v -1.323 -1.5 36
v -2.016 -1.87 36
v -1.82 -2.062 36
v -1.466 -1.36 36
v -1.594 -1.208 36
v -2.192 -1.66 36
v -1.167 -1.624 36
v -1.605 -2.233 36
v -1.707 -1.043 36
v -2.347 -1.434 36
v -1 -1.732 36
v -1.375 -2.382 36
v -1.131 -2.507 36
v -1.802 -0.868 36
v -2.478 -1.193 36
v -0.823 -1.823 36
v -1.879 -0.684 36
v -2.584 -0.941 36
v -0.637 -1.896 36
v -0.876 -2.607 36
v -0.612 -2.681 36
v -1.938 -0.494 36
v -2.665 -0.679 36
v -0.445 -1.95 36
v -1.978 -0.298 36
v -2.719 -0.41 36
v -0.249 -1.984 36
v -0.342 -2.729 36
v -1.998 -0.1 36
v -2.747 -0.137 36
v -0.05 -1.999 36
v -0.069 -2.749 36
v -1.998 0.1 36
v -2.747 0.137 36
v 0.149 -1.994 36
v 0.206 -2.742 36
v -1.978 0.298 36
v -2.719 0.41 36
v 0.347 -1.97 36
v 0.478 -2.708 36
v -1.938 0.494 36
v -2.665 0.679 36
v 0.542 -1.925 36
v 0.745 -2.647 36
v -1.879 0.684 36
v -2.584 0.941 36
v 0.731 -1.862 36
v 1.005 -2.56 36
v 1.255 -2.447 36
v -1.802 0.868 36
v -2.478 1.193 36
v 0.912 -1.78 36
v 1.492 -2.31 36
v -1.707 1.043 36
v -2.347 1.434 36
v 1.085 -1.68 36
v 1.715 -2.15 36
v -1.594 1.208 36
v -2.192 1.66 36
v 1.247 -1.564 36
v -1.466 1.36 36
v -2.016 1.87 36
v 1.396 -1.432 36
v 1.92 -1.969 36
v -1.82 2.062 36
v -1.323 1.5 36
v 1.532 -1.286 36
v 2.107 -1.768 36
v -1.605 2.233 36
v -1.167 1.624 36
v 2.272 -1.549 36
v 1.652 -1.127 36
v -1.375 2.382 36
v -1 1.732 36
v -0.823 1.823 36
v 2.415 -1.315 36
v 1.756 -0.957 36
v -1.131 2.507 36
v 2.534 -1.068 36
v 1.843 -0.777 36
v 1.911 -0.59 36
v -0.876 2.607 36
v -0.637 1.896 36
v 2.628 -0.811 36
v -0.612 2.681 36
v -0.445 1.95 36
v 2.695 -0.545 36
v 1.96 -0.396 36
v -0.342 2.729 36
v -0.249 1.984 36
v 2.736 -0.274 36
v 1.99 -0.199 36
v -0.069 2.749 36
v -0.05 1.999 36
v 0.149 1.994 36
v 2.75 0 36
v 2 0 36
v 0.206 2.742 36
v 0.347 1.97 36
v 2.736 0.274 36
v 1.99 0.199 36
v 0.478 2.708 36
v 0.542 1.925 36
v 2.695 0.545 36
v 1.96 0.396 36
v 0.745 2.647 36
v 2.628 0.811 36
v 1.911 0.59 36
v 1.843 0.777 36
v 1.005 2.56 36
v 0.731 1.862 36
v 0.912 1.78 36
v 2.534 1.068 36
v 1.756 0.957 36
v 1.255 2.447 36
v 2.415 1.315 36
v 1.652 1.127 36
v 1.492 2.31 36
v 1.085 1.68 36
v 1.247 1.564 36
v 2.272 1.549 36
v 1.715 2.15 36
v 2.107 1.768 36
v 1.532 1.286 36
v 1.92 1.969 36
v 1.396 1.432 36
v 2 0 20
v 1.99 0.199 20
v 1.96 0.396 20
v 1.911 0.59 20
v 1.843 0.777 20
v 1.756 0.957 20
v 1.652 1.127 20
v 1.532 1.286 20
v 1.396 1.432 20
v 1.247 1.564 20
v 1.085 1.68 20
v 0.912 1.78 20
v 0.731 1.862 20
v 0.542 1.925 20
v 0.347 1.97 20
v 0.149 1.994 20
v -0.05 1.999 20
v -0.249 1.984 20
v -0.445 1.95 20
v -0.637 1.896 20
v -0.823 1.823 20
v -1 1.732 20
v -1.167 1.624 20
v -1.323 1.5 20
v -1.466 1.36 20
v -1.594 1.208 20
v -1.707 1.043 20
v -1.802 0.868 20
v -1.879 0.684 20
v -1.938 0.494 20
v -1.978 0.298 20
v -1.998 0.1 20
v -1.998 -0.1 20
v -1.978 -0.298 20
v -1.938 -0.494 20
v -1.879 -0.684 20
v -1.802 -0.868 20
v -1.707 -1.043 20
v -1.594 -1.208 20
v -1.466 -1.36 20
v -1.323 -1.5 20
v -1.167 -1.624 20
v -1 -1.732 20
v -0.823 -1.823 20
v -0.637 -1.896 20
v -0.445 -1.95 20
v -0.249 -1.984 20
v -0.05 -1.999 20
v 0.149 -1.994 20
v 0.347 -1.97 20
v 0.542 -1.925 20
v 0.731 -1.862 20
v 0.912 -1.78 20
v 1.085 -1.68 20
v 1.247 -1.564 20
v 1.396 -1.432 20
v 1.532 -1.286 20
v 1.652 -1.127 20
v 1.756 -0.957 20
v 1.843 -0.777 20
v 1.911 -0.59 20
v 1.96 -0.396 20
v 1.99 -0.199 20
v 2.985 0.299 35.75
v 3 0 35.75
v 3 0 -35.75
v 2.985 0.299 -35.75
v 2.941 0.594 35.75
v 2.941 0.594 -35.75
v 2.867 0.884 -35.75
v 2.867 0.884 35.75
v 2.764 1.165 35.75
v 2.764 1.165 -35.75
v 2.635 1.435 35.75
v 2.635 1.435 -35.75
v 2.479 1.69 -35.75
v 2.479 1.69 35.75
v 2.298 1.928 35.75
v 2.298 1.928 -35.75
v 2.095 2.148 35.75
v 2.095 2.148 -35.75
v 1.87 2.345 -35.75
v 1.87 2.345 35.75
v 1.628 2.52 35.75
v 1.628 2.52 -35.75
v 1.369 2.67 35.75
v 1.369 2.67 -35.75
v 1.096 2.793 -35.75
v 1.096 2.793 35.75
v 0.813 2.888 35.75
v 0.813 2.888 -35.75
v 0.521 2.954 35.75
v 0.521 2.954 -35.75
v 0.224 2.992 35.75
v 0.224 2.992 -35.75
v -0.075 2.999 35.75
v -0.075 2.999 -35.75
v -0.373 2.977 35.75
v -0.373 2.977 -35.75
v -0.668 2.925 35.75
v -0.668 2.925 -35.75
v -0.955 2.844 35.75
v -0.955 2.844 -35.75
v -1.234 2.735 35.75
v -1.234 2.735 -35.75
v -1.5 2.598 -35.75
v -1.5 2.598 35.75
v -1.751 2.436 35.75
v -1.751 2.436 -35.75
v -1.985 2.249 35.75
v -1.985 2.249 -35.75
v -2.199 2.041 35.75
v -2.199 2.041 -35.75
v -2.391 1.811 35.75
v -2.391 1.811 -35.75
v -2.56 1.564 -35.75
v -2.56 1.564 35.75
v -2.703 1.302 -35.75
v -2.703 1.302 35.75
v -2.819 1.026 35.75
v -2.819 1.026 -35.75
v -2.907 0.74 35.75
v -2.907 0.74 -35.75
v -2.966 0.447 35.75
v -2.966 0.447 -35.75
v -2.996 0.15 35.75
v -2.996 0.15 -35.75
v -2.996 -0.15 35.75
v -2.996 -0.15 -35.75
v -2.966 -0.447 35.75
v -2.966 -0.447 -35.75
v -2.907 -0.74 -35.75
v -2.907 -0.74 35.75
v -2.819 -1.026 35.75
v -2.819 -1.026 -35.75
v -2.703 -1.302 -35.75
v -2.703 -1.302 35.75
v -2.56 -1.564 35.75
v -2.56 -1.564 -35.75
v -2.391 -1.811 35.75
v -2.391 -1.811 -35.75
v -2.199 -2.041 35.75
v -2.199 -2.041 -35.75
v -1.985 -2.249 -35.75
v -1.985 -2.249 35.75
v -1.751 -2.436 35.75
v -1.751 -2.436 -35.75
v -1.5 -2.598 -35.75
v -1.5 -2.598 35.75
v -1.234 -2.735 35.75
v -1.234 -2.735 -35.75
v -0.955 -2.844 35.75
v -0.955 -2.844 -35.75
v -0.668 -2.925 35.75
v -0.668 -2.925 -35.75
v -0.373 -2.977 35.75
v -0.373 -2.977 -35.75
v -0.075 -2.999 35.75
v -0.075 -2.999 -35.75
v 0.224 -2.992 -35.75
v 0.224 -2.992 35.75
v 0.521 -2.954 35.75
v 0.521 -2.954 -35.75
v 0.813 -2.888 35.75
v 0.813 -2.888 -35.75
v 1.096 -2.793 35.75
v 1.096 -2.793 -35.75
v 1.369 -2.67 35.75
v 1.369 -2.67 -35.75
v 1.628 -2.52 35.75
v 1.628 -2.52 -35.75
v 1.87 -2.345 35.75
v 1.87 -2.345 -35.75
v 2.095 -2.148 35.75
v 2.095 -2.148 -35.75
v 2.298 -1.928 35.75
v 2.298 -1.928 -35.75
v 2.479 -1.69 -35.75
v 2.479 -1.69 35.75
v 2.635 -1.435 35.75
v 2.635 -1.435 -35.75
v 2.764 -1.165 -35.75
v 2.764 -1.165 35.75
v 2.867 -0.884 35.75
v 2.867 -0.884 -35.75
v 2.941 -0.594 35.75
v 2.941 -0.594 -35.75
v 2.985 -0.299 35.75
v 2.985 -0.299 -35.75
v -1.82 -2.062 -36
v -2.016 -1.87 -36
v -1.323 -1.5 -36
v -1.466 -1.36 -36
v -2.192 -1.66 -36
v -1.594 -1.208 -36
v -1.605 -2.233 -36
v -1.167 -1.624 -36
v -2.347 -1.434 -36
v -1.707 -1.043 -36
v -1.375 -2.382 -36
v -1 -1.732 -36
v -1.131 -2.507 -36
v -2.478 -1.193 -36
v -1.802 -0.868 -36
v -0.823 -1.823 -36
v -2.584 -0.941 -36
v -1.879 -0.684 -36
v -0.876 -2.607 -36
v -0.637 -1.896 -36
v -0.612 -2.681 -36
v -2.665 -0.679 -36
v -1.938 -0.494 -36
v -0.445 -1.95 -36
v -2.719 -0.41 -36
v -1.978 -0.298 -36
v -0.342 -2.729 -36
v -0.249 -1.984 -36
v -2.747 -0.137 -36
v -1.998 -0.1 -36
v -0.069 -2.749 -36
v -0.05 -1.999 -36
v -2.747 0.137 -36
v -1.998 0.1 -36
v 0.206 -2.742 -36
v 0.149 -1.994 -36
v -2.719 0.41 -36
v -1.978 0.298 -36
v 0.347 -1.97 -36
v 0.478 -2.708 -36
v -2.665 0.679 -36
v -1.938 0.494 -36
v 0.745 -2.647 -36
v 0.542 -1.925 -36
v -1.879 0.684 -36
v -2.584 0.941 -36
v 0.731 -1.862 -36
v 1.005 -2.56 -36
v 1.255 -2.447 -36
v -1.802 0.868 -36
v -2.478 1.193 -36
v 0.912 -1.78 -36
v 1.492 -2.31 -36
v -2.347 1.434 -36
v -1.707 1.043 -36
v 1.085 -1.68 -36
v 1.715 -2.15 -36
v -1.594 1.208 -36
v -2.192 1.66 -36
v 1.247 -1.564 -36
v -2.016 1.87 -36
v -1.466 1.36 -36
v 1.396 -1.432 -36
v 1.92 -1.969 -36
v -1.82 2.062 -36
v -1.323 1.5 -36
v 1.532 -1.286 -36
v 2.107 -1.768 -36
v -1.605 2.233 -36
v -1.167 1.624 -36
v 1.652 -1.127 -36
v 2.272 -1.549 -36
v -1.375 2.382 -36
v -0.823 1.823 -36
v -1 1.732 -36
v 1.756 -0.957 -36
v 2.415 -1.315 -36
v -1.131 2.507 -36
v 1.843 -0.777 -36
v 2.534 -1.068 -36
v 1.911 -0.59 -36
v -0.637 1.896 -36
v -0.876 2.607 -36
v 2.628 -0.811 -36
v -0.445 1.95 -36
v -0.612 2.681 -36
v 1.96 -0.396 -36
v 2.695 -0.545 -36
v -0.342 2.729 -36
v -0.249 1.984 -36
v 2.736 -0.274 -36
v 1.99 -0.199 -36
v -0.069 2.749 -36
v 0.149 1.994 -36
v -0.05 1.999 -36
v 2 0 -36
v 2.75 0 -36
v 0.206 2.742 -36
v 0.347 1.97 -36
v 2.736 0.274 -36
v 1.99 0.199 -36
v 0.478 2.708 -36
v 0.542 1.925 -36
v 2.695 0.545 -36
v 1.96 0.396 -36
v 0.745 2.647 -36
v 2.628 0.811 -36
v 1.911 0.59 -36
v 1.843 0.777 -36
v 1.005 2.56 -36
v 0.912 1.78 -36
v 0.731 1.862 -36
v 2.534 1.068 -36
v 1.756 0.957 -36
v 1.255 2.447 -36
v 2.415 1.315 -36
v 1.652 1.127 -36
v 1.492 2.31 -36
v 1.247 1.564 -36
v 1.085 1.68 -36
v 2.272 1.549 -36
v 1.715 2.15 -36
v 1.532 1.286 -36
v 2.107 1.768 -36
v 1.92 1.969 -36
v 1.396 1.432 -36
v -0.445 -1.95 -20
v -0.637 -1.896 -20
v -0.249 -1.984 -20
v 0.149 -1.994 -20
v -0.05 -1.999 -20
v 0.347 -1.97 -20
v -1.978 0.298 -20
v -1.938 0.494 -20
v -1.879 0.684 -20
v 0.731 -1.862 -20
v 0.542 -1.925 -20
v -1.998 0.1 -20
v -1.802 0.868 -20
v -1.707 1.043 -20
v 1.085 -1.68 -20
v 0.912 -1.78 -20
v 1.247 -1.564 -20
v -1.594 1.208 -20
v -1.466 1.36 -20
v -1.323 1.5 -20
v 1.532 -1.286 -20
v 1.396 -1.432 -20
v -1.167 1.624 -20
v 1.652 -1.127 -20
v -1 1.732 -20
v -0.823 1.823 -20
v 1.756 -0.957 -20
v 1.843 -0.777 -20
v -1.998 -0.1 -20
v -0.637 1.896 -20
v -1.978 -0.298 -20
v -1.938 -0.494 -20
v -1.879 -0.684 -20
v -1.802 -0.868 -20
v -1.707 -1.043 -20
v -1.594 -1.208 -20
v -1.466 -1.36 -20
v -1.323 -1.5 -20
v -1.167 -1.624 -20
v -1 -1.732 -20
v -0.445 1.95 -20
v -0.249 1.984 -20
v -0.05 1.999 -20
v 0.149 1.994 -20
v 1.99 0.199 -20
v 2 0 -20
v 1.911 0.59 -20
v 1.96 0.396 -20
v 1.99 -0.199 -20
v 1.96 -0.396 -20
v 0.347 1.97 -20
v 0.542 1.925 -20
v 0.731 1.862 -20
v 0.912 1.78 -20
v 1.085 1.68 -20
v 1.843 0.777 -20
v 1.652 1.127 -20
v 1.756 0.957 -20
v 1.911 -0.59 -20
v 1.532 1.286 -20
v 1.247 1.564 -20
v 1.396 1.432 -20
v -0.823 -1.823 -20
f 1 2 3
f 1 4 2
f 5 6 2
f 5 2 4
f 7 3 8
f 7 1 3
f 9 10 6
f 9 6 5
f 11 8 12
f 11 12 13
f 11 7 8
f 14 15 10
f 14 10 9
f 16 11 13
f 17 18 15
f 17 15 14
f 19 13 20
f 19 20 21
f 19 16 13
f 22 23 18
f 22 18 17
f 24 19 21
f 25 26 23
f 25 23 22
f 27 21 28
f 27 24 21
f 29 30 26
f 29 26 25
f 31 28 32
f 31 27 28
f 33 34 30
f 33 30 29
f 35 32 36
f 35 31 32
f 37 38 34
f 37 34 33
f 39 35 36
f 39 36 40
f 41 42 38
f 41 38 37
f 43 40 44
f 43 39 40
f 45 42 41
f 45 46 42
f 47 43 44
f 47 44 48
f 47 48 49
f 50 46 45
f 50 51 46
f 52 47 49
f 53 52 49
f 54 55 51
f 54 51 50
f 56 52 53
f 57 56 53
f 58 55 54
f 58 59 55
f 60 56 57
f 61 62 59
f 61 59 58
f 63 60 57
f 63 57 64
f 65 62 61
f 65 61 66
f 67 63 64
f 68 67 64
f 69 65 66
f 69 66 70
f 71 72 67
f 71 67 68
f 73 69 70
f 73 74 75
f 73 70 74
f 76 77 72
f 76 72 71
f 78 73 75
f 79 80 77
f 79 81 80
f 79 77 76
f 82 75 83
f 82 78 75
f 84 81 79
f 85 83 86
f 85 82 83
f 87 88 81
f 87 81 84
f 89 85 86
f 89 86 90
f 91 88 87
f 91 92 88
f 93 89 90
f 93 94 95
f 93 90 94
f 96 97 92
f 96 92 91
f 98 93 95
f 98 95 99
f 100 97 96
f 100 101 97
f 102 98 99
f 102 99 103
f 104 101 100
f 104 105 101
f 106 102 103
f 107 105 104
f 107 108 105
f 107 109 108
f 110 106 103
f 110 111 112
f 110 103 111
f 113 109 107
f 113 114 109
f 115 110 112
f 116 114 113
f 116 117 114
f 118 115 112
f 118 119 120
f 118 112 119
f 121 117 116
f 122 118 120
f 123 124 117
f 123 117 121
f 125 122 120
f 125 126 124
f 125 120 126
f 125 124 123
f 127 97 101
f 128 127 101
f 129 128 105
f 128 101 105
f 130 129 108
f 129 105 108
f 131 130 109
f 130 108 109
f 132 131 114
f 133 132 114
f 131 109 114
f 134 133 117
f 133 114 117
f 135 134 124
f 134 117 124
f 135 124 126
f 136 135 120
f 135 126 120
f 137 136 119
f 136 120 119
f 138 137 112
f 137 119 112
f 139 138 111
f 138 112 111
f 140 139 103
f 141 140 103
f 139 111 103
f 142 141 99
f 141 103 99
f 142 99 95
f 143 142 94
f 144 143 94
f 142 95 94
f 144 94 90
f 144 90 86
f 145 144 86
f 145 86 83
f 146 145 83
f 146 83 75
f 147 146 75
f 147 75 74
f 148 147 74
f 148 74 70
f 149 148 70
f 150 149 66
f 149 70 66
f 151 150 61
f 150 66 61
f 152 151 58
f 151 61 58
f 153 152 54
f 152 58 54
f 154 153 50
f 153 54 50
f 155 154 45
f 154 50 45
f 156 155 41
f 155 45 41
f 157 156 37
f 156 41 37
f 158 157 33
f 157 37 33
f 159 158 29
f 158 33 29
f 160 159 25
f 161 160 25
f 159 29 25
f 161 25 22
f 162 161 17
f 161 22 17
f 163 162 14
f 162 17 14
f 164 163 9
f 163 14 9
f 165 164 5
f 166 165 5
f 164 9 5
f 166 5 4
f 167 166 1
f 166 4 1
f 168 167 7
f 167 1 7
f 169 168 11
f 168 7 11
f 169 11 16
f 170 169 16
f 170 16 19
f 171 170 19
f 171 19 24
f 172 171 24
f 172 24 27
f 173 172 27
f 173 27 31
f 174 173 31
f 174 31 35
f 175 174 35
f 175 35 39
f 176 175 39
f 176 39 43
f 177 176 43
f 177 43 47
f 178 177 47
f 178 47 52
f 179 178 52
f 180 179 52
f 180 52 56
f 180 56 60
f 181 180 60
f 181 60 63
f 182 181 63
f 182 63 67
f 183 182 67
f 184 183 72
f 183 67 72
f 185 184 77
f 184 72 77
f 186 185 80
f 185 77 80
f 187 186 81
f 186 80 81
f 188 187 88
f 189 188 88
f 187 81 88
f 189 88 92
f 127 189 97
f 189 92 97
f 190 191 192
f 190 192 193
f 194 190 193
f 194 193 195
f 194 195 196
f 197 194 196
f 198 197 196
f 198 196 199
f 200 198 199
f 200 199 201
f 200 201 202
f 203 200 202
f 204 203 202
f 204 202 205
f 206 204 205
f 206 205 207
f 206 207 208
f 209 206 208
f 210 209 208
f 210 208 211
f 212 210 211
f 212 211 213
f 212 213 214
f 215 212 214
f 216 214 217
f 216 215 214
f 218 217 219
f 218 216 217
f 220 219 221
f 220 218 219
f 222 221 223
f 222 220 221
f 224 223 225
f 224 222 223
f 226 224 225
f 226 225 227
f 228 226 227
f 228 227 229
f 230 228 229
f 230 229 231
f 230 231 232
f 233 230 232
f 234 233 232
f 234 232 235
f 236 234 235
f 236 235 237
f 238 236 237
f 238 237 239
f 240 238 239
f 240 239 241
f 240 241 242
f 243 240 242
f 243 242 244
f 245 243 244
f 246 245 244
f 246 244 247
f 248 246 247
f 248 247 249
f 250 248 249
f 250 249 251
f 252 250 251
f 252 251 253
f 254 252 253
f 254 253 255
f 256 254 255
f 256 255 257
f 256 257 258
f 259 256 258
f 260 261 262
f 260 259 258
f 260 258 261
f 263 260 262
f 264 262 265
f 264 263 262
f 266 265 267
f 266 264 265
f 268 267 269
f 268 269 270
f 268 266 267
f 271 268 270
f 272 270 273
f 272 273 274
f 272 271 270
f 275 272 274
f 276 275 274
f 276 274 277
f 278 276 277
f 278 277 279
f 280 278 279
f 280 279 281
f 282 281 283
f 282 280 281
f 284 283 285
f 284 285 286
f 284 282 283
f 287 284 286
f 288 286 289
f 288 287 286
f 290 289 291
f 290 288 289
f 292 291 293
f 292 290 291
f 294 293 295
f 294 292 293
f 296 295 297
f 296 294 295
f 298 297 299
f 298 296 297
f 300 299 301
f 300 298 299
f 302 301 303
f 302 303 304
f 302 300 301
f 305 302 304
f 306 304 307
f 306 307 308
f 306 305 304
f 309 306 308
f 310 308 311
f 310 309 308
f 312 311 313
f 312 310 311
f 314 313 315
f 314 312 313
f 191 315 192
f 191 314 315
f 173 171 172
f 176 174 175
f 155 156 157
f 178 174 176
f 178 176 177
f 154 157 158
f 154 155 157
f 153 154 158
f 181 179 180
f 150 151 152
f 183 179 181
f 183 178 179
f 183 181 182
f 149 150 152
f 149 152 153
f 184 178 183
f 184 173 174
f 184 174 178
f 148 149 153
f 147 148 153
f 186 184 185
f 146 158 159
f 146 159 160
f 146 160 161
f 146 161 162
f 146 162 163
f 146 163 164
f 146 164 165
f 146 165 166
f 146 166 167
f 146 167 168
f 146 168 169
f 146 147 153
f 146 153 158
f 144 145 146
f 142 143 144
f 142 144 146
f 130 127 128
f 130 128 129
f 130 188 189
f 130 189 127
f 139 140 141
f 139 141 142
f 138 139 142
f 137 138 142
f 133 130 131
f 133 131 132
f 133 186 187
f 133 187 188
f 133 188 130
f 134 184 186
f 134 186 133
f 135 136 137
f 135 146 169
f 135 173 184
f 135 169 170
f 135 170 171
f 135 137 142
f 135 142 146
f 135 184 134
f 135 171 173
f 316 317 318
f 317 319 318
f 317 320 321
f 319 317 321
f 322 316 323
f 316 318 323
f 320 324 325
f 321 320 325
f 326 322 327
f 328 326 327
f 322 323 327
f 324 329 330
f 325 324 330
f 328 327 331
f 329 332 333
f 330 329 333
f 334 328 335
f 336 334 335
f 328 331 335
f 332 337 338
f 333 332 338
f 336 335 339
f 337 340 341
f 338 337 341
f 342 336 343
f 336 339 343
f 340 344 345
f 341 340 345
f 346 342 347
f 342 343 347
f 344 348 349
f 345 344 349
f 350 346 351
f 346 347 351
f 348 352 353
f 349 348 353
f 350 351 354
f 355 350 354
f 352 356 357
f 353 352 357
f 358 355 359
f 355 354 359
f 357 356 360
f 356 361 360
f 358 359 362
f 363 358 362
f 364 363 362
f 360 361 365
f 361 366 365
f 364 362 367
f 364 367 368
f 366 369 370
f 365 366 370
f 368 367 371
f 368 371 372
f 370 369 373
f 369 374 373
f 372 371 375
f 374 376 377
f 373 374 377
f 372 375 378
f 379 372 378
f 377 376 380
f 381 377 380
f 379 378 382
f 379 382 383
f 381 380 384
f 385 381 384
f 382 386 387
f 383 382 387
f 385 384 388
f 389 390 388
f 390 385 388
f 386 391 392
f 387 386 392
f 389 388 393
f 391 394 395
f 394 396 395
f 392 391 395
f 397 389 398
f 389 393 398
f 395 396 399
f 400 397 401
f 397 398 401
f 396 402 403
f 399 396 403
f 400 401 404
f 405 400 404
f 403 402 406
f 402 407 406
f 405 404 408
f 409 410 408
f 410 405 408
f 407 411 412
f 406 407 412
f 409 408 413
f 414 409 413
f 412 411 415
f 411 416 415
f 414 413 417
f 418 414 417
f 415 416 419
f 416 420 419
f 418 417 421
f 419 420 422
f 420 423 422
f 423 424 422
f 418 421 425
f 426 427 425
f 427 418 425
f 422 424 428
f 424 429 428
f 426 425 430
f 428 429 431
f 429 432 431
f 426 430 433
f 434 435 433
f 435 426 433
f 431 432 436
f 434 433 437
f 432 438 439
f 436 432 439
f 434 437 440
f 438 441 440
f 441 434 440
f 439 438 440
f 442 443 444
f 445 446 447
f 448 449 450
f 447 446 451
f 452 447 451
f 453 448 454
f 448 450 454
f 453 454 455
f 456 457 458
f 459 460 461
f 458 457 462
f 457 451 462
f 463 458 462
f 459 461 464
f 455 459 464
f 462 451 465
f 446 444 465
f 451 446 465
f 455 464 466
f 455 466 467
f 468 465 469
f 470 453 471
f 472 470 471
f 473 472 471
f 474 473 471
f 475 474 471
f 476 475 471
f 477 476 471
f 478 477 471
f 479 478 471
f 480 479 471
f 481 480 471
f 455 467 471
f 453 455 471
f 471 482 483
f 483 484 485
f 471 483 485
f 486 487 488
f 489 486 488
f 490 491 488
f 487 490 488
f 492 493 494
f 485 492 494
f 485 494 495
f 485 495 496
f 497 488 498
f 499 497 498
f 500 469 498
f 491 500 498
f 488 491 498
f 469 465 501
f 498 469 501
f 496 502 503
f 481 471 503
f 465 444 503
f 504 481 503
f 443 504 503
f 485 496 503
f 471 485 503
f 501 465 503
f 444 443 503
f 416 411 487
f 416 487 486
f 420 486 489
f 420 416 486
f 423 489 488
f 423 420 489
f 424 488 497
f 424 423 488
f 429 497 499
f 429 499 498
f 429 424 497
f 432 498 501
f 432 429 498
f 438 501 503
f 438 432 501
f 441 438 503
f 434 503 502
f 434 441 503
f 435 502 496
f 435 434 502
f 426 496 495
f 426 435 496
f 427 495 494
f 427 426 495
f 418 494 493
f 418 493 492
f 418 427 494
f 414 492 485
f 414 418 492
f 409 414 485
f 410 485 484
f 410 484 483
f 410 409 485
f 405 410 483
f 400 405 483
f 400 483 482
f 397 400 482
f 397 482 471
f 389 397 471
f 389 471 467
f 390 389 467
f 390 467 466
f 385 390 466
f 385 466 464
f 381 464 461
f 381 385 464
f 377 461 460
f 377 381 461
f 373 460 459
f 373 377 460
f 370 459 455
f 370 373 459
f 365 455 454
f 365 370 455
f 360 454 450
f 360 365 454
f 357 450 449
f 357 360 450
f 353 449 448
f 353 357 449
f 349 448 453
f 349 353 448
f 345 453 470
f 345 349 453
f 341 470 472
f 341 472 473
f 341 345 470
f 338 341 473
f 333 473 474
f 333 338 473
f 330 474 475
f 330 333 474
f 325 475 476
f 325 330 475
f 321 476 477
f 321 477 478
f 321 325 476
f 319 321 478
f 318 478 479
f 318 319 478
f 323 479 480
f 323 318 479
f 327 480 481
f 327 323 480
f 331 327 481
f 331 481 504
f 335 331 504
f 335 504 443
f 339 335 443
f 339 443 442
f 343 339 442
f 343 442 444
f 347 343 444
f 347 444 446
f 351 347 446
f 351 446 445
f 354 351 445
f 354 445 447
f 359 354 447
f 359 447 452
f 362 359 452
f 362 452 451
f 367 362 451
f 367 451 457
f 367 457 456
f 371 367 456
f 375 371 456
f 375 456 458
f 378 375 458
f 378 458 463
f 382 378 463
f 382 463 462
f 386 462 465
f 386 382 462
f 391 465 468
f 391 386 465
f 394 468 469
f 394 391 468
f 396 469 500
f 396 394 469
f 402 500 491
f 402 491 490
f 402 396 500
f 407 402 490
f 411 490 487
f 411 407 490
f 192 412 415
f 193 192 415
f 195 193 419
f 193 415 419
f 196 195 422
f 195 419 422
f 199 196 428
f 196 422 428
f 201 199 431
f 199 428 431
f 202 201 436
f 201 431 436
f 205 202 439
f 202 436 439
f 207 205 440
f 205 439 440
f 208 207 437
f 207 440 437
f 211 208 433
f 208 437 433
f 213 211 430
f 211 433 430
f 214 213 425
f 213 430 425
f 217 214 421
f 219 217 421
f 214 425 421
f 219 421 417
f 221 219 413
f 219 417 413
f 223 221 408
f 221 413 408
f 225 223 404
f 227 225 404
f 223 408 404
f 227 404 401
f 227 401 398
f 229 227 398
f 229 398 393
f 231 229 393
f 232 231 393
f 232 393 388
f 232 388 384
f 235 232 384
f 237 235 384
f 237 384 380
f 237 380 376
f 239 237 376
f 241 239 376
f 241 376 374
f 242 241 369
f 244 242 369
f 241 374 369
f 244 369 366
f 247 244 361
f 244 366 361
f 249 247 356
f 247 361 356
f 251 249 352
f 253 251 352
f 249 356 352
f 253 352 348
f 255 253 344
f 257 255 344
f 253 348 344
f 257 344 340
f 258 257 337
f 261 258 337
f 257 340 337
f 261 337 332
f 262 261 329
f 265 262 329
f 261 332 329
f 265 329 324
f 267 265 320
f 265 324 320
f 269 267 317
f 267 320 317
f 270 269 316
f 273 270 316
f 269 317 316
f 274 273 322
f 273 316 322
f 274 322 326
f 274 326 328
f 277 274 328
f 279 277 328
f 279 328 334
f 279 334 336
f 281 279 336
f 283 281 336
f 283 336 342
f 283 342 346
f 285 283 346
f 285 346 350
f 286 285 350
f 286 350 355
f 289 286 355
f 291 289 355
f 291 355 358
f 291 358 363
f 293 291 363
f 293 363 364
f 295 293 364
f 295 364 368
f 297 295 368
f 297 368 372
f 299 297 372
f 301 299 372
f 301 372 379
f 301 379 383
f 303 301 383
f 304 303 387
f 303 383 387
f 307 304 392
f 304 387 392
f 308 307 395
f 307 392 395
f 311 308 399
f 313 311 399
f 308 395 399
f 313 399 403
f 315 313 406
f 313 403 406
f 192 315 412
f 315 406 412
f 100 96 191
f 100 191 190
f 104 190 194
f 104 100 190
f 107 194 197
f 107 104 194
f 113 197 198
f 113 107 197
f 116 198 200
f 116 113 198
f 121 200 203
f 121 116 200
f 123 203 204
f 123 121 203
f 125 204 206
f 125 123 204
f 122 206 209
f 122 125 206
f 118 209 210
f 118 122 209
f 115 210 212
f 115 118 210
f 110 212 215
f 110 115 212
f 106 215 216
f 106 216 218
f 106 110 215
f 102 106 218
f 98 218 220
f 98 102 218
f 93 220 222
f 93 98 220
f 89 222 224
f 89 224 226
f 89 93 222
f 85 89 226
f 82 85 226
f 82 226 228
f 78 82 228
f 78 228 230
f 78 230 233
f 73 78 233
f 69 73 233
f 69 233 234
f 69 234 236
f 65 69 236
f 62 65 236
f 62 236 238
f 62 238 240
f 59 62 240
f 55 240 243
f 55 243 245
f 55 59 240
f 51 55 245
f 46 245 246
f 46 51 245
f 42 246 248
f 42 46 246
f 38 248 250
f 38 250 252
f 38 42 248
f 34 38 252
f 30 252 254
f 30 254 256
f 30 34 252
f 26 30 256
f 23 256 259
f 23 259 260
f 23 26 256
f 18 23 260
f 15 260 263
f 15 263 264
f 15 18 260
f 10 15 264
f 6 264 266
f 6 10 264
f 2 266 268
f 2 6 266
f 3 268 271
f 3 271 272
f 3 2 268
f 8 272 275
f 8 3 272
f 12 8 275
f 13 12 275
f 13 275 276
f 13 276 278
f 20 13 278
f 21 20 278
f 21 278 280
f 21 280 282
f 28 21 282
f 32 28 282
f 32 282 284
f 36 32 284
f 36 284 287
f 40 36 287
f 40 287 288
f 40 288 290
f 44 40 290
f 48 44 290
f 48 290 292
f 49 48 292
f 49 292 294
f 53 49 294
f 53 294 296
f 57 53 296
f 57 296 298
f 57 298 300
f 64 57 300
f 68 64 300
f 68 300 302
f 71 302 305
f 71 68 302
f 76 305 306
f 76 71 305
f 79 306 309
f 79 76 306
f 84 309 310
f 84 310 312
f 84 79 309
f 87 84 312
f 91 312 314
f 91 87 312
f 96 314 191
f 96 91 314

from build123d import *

# Parameters (mm, degrees)
ESBO_O1_R                = 3
RESSALTO_EXTRUS_O1_DEPTH = 36
CHANFRO1_SIZE            = 0.25
ESBO_O2_R                = 2
CORTE_EXTRUS_O1_DEPTH    = 16


with BuildPart() as part:
    # Esboço1 → Ressalto-extrusão1 (new, symmetric)
    with BuildSketch(Plane.XY):
        Circle(ESBO_O1_R)
    extrude(amount=RESSALTO_EXTRUS_O1_DEPTH, both=True)

    # Chanfro1
    chanfro1_edges = [part.edges().sort_by_distance(p)[0] for p in [
        (-3, 0, -36),
        (-3, 0, 36),
    ]]
    chamfer(chanfro1_edges, length=CHANFRO1_SIZE)

    # Esboço2 → Corte-extrusão1 (cut)
    with BuildSketch(Plane.XY.offset(36)):
        Circle(ESBO_O2_R)
    corte_extrus_o1 = extrude(amount=-CORTE_EXTRUS_O1_DEPTH, mode=Mode.SUBTRACT)

    # Espelhar1: Corte-extrusão1 across plane
    add(corte_extrus_o1.mirror(Plane.XY), mode=Mode.SUBTRACT)


solid = part.part
